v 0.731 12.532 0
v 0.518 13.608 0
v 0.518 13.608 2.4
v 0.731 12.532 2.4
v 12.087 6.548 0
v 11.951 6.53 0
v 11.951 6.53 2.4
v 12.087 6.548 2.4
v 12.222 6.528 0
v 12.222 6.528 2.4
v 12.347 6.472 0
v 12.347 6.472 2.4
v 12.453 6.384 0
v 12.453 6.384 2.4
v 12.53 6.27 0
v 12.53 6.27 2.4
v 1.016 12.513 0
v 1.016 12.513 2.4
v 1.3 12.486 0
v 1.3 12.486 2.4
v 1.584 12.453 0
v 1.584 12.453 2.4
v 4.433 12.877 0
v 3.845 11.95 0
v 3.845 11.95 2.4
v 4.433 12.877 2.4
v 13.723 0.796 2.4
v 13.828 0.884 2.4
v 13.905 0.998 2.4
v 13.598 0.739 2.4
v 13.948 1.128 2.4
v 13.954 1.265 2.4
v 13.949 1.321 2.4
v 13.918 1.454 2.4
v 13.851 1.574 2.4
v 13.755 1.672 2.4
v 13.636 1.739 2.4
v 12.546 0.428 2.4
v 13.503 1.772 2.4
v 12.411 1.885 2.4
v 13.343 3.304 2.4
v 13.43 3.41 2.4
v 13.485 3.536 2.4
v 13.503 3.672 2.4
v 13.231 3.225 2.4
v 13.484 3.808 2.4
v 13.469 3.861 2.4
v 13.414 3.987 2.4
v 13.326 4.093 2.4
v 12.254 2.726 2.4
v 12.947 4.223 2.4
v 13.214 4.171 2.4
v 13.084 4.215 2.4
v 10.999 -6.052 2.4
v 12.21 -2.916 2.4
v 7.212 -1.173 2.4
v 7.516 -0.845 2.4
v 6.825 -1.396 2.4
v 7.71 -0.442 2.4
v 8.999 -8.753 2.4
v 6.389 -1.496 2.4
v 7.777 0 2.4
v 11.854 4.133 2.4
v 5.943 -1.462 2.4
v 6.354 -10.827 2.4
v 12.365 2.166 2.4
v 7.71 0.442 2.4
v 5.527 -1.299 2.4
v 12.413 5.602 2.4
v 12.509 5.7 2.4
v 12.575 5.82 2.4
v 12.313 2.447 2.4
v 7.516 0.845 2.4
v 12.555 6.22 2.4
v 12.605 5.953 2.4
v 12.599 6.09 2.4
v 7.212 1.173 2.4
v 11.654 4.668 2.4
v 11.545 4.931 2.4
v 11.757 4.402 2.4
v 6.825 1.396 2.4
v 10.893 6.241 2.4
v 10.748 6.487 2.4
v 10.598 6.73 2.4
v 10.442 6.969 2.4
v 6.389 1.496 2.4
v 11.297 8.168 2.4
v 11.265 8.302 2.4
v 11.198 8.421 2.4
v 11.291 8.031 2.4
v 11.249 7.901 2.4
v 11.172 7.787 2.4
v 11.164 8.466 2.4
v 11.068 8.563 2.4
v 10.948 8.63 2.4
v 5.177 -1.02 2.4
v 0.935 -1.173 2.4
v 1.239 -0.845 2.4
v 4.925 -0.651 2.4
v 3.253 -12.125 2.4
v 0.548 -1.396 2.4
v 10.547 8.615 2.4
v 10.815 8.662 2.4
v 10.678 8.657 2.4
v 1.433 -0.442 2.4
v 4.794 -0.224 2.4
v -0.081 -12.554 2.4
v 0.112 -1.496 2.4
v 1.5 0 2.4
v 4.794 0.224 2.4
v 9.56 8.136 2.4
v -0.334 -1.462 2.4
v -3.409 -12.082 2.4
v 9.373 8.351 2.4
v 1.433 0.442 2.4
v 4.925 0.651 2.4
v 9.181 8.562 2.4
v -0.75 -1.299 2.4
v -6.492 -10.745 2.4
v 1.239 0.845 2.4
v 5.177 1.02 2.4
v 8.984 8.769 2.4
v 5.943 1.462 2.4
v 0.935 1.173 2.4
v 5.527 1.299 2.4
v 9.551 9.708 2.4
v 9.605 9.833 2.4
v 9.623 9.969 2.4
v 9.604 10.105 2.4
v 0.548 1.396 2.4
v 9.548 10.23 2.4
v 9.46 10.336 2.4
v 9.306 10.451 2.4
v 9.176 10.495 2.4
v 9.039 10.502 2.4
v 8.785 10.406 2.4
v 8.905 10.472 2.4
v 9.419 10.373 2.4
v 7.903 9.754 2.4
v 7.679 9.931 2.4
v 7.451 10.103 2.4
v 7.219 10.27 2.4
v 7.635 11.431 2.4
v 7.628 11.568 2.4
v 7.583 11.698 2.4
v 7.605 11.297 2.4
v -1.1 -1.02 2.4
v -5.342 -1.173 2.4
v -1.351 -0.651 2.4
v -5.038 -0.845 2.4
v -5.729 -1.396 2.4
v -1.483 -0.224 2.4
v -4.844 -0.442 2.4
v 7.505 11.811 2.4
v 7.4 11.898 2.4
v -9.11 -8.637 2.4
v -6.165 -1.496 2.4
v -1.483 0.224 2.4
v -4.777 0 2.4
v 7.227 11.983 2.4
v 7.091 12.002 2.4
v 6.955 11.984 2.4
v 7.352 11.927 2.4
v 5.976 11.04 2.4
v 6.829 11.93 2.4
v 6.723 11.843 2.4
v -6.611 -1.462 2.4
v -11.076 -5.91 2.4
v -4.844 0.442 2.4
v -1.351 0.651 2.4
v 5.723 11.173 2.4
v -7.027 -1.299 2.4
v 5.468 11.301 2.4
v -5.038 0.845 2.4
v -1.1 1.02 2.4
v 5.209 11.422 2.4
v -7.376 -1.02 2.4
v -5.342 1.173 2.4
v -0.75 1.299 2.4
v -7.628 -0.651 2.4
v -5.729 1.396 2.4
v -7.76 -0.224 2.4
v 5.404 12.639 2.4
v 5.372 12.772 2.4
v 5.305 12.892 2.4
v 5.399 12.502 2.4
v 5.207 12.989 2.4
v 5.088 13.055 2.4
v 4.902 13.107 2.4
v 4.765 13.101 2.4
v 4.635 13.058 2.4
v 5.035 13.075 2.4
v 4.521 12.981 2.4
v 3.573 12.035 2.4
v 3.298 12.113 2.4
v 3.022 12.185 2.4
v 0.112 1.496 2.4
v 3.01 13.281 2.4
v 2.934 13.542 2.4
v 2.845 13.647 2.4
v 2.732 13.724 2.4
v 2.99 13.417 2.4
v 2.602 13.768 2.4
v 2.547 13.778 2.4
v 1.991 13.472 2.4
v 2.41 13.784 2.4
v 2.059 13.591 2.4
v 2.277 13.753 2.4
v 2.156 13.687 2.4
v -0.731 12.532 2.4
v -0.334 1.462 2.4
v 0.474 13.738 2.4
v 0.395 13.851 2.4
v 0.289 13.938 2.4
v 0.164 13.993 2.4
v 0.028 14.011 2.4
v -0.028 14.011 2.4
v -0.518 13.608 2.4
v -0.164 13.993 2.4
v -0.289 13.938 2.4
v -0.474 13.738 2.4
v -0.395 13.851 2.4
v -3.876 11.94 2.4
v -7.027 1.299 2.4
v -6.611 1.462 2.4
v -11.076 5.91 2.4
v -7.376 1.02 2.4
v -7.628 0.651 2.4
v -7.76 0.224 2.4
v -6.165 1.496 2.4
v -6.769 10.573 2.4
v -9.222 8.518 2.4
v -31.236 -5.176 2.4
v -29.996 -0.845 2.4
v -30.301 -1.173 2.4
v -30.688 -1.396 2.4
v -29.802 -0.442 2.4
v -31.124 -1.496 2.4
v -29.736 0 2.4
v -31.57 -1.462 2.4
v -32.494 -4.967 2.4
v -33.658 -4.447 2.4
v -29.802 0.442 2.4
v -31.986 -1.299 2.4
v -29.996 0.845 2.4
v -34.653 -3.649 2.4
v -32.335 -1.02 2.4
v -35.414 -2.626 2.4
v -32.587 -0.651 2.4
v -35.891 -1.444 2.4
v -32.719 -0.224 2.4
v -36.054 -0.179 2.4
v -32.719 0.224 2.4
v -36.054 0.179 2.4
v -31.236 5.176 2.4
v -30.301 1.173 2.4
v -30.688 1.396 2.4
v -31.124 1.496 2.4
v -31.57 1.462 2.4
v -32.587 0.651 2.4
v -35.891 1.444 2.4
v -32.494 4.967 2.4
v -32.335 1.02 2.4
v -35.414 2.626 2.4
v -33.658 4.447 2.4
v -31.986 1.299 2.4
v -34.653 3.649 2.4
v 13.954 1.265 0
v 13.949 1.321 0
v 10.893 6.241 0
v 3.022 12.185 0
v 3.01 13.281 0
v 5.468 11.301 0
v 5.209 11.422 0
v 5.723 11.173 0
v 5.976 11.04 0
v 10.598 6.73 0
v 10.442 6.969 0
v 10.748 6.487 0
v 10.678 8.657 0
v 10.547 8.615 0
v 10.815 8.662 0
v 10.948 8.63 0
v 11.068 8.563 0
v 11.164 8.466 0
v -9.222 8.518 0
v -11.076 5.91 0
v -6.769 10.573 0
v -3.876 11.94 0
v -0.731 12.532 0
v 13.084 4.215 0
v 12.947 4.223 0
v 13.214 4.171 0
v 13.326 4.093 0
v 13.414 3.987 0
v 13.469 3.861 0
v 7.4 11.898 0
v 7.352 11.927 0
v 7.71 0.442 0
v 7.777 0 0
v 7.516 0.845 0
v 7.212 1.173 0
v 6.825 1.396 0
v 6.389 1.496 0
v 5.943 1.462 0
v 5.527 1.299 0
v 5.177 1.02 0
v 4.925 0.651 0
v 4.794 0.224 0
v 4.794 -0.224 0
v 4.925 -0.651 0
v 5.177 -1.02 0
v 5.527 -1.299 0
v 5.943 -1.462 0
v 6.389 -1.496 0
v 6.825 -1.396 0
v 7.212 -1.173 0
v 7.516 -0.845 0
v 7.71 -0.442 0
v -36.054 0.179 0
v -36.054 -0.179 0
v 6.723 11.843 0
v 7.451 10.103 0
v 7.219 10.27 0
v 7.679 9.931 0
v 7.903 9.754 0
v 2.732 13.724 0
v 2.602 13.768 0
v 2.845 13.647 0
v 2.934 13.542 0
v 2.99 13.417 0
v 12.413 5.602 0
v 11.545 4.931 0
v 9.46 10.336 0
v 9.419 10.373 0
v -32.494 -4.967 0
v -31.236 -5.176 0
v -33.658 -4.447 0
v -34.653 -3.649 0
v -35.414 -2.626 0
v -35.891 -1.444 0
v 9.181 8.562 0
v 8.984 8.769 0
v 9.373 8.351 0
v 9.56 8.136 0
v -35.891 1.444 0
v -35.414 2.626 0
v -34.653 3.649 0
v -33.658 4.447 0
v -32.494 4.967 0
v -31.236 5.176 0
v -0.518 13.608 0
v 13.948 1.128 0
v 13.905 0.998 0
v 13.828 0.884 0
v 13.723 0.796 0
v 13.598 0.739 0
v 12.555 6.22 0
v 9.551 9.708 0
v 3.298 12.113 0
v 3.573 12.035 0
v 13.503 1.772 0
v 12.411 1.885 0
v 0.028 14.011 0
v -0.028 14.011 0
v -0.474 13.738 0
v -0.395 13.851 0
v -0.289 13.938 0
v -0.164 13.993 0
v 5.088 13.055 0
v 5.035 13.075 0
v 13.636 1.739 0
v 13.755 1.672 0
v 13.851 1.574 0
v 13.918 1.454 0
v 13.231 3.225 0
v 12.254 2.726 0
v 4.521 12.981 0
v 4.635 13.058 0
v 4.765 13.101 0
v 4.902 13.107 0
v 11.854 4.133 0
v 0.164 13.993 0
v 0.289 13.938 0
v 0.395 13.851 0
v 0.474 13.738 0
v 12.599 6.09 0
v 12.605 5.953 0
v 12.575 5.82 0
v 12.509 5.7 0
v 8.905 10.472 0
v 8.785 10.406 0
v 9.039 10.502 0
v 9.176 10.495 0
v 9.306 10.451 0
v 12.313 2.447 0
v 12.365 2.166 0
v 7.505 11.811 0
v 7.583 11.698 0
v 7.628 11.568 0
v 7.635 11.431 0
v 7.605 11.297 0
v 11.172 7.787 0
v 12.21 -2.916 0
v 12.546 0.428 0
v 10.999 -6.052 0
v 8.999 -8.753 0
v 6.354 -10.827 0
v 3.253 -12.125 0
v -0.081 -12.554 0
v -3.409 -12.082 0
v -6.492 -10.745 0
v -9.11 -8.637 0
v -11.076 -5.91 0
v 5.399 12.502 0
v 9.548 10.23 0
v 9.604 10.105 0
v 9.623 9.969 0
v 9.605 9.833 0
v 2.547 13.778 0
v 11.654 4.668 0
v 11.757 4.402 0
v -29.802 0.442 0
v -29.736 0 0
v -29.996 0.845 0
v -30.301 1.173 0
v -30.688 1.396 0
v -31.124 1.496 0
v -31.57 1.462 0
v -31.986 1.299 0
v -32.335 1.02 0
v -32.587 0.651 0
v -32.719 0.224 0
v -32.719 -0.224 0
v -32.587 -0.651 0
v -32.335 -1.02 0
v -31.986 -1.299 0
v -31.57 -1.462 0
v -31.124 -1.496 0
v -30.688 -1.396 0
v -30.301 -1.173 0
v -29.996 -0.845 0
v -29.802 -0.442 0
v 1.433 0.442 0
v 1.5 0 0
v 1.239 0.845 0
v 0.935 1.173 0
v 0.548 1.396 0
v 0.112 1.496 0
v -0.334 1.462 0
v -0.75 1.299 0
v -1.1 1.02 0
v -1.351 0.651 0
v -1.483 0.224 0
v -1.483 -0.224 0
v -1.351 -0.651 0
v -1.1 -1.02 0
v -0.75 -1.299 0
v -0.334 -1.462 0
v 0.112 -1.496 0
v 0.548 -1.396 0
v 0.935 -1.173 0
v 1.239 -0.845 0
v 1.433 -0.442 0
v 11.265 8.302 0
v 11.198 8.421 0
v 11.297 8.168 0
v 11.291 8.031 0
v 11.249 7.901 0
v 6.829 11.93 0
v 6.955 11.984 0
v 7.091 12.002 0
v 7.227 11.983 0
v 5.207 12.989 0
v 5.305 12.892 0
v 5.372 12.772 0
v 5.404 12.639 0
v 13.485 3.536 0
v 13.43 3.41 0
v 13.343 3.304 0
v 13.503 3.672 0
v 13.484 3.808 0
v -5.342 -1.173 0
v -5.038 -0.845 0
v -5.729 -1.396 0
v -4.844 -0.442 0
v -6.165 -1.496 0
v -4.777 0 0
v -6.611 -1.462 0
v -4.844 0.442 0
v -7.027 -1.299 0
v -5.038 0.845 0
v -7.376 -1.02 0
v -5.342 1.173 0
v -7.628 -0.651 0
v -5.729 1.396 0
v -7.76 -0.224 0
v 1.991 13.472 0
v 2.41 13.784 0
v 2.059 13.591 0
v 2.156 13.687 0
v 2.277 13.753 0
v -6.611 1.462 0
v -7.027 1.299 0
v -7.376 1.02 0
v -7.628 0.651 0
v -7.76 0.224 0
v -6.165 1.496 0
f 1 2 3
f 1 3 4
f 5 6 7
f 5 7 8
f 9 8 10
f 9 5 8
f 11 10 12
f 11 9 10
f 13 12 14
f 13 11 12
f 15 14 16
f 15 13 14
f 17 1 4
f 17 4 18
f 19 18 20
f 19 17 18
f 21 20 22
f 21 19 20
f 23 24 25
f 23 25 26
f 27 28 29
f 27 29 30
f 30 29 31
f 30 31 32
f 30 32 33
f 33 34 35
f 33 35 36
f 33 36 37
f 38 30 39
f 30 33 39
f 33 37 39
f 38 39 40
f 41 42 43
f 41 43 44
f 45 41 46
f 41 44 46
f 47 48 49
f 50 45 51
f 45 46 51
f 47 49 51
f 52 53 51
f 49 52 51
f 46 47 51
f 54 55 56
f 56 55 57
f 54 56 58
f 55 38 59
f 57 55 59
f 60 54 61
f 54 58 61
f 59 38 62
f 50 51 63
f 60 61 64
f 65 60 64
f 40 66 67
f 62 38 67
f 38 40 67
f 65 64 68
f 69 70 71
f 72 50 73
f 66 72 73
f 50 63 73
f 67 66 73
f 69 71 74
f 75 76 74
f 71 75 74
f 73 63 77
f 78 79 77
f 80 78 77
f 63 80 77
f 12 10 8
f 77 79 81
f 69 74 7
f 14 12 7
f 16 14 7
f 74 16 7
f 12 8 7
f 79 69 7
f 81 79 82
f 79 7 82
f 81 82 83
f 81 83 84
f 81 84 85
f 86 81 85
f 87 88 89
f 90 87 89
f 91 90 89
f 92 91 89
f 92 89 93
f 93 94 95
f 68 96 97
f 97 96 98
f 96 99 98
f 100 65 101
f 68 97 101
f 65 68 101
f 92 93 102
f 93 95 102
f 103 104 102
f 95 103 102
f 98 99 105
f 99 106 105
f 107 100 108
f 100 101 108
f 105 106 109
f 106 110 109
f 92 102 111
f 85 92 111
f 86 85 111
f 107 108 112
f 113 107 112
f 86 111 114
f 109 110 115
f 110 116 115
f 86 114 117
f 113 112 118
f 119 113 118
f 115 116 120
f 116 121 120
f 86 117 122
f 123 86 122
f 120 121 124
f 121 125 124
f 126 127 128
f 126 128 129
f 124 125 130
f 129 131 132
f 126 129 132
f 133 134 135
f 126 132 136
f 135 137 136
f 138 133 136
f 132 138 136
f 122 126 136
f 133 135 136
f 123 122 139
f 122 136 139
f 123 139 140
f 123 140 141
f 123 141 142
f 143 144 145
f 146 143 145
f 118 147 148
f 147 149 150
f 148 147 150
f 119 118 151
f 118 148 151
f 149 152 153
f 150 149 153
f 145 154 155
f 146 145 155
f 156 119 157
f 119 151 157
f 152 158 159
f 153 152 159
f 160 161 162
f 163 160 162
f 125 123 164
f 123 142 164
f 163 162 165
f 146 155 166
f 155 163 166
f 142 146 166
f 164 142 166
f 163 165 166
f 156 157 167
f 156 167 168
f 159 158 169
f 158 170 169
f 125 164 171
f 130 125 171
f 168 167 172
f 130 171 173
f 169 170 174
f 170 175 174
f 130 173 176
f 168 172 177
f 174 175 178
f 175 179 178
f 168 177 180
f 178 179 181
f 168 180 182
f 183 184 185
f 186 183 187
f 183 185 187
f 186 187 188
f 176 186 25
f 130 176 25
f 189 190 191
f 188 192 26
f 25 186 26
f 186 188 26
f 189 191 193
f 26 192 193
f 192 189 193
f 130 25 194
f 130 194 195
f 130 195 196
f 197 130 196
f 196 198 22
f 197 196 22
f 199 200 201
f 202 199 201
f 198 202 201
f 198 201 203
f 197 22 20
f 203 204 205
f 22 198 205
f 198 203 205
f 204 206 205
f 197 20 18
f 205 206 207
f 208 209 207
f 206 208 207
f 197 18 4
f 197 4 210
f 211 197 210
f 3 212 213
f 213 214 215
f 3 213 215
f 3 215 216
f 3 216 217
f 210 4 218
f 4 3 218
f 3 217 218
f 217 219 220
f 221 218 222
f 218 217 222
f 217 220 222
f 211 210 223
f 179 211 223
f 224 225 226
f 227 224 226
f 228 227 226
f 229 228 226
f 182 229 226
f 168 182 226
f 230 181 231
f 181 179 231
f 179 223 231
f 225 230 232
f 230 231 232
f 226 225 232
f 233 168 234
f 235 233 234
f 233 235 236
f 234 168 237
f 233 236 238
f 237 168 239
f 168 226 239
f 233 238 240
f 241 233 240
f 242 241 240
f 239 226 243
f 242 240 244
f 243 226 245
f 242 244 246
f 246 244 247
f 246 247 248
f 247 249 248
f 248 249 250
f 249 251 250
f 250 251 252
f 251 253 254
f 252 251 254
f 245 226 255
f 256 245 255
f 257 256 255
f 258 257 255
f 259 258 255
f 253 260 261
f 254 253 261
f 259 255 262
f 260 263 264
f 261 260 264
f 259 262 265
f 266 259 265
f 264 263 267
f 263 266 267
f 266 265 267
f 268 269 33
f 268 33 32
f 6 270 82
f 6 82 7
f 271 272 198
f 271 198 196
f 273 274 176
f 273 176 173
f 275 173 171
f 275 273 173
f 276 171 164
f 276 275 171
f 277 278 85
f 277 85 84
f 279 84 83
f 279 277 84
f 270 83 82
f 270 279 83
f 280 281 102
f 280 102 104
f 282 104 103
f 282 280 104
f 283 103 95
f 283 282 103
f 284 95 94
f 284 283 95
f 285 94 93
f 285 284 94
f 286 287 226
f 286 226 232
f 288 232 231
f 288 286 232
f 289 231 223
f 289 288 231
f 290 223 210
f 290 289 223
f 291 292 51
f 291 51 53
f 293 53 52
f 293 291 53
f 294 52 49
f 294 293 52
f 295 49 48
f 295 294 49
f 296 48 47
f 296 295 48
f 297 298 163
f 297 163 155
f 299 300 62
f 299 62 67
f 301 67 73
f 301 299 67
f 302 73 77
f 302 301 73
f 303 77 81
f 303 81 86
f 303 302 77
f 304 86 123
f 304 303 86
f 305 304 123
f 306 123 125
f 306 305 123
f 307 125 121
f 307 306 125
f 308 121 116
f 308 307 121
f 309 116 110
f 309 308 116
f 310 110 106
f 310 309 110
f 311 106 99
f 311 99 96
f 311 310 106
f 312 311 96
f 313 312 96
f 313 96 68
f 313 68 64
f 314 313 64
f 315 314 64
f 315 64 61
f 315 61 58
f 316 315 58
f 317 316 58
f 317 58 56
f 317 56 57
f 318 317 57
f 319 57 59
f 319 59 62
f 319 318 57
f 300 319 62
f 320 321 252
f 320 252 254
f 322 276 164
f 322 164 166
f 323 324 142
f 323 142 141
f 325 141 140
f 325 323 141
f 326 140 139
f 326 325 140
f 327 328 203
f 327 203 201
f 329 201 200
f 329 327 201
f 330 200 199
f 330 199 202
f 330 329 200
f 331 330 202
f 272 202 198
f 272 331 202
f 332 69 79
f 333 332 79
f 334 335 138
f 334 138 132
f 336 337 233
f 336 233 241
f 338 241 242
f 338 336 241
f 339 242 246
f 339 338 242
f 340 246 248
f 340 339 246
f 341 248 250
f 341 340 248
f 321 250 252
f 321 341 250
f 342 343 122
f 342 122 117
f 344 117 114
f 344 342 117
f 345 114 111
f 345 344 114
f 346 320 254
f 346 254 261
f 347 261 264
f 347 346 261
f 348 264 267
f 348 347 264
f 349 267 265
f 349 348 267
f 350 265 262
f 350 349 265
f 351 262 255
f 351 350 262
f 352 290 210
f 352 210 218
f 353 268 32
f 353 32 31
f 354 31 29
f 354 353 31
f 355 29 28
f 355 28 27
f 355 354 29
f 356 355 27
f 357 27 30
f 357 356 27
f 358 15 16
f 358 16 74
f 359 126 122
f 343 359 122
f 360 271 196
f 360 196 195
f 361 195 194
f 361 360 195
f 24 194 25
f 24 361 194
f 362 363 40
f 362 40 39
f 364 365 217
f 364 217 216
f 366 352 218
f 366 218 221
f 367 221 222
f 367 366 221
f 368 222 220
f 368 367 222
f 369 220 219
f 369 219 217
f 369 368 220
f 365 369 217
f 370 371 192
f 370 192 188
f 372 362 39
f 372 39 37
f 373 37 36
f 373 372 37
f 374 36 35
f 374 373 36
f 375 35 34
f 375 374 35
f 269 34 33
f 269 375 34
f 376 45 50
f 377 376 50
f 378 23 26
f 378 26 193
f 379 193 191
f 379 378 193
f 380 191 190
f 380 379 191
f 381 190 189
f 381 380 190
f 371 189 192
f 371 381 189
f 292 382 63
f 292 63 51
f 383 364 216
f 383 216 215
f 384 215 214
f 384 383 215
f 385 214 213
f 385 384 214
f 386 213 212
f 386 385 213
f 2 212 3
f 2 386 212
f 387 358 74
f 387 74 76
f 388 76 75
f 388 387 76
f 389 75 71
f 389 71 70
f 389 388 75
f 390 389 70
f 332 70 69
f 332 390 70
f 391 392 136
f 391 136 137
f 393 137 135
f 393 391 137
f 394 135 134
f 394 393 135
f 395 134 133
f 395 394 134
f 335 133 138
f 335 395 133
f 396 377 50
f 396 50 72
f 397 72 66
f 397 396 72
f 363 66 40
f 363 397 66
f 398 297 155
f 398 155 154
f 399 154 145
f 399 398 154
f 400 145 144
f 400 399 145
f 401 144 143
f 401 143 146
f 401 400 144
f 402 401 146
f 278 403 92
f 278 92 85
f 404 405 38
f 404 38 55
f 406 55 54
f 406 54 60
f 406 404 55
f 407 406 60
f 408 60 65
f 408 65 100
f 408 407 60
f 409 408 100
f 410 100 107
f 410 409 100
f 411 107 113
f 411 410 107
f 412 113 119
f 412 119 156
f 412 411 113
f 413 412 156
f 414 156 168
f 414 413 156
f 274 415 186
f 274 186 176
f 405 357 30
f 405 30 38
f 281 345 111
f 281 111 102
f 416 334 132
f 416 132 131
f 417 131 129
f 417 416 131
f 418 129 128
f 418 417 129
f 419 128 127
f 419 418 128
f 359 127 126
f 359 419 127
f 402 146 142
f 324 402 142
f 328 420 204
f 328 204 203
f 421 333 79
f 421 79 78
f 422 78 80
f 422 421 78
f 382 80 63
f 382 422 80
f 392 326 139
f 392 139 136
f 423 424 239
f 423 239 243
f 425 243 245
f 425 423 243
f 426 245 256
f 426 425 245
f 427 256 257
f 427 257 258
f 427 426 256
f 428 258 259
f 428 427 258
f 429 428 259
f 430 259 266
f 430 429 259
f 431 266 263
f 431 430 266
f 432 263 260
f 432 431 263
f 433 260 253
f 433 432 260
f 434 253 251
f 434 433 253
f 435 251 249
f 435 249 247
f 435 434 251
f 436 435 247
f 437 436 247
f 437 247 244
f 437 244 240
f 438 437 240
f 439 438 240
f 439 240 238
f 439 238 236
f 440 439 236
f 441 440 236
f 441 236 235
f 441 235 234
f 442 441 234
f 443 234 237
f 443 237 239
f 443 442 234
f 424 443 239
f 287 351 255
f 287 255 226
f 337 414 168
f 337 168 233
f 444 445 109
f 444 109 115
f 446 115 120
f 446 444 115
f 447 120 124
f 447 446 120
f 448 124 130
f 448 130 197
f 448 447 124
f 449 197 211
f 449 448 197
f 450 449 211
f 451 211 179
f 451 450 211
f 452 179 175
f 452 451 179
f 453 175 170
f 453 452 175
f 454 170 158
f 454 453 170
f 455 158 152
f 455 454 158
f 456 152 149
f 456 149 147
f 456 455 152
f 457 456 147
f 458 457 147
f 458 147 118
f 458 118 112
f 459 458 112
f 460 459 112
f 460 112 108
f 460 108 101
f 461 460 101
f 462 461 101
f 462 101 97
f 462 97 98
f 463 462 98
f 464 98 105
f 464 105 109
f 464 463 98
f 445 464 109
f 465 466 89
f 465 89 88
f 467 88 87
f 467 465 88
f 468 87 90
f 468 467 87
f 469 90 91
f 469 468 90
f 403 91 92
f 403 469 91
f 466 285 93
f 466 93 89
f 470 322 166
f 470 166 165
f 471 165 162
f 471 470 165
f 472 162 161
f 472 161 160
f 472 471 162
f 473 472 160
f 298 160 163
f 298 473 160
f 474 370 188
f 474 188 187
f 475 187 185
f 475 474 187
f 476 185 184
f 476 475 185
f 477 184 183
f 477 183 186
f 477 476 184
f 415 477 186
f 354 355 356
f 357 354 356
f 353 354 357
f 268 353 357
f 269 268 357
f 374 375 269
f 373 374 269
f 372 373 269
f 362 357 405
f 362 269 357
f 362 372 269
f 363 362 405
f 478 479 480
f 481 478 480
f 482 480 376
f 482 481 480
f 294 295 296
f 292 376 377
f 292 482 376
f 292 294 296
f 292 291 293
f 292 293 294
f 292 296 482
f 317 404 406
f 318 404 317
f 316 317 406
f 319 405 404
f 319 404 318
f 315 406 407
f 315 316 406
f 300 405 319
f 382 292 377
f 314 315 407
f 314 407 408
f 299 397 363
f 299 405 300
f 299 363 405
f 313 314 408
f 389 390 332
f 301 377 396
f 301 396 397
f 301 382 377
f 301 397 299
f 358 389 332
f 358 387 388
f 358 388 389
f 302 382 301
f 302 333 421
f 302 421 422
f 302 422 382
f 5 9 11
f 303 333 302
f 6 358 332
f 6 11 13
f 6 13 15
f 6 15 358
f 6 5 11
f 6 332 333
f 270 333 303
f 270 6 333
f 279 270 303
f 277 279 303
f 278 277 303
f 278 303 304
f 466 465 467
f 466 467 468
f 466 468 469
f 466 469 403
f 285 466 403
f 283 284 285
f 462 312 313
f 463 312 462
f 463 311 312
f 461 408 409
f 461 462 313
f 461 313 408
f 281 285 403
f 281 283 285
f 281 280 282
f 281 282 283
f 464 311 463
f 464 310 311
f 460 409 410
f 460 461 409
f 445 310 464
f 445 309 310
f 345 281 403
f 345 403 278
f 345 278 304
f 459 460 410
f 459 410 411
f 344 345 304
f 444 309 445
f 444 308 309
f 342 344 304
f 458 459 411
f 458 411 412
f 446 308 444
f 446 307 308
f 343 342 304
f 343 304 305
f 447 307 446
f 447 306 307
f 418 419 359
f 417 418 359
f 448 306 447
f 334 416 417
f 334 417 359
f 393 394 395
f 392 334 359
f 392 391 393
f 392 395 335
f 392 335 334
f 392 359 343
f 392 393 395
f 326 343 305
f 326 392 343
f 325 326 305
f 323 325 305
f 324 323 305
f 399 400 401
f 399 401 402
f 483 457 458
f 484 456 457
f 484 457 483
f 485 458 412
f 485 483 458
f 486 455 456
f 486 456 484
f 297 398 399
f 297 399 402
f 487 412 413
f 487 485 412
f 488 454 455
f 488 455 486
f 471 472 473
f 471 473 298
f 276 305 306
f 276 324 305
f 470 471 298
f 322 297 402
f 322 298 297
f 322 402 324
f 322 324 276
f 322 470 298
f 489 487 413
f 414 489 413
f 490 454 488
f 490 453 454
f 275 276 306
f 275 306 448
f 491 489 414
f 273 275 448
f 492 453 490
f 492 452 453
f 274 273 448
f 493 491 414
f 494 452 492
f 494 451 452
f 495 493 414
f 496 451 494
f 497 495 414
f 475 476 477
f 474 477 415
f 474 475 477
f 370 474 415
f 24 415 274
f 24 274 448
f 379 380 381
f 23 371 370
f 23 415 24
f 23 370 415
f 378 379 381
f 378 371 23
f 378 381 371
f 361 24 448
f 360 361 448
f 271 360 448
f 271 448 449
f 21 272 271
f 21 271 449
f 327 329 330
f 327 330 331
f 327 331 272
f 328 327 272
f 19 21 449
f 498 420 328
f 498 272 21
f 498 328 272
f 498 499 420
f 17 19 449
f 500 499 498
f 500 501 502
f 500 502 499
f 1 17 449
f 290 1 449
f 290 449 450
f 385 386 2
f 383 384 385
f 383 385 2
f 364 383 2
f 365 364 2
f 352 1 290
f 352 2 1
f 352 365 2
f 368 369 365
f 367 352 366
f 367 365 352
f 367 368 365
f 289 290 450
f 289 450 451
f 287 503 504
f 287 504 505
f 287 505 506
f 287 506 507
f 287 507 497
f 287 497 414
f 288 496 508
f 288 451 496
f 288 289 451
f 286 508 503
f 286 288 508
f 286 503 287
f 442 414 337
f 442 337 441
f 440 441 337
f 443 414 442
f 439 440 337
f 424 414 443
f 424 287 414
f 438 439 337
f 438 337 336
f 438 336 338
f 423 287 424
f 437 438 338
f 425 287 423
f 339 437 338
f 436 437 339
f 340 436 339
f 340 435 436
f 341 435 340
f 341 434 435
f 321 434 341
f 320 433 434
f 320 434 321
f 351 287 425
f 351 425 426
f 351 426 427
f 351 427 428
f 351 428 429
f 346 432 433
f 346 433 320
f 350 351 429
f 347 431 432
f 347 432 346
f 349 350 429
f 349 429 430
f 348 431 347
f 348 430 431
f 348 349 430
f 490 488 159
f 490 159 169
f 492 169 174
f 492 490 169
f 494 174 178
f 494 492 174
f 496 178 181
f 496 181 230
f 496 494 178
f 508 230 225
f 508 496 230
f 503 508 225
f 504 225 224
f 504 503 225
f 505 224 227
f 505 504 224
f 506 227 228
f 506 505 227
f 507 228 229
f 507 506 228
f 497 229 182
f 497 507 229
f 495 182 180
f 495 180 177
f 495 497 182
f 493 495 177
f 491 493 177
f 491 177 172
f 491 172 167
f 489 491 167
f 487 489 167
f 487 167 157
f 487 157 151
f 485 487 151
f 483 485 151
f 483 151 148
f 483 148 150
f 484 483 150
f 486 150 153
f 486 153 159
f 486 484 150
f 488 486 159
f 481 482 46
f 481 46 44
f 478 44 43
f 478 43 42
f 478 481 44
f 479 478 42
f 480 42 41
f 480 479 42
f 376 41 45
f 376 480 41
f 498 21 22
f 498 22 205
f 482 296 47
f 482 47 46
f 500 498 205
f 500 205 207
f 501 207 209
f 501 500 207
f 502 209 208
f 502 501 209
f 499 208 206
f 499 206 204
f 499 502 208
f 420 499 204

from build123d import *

# Parameters (mm, degrees)
SKETCH1_R           = 1.5
BOSS_EXTRUDE1_DEPTH = 2.4


with BuildPart() as part:
    # Sketch1 → Boss-Extrude1 (new body)
    with BuildSketch(Plane.XY):
        with BuildLine():
            Line((2.547107201, 13.777973489), (2.60207137, 13.767698905))
            ThreePointArc((2.60207137, 13.767698905), (2.893171321, 13.597662774), (3.010168721, 13.281493396))
            Line((3.010168721, 13.281493396), (3.021754222, 12.184659018))
            ThreePointArc((3.021754222, 12.184659018), (3.435499758, 12.074529199), (3.845249182, 11.950354501))
            Line((3.845249182, 11.950354501), (4.432508267, 12.876802904))
            ThreePointArc((4.432508267, 12.876802904), (4.698423191, 13.084024332), (5.035433845, 13.075347588))
            Line((5.035433845, 13.075347588), (5.087574195, 13.055148308))
            ThreePointArc((5.087574195, 13.055148308), (5.342473559, 12.83451789), (5.399382885, 12.502233681))
            Line((5.399382885, 12.502233681), (5.209228333, 11.421946163))
            ThreePointArc((5.209228333, 11.421946163), (5.595692764, 11.23766597), (5.975648384, 11.040314323))
            Line((5.975648384, 11.040314323), (6.723142715, 11.843079608))
            ThreePointArc((6.723142715, 11.843079608), (7.02260677, 11.997910958), (7.35228483, 11.927456407))
            Line((7.35228483, 11.927456407), (7.399825783, 11.898020294))
            ThreePointArc((7.399825783, 11.898020294), (7.609844268, 11.634308893), (7.604727542, 11.297225393))
            Line((7.604727542, 11.297225393), (7.219308422, 10.27027263))
            ThreePointArc((7.219308422, 10.27027263), (7.565331165, 10.018117505), (7.902554048, 9.754309483))
            Line((7.902554048, 9.754309483), (8.784828602, 10.406054439))
            ThreePointArc((8.784828602, 10.406054439), (9.107643898, 10.503223117), (9.418762572, 10.373390003))
            Line((9.418762572, 10.373390003), (9.460085179, 10.335719469))
            ThreePointArc((9.460085179, 10.335719469), (9.618070857, 10.03790746), (9.551102323, 9.707503643))
            Line((9.551102323, 9.707503643), (8.98354362, 8.76885728))
            ThreePointArc((8.98354362, 8.76885728), (9.277341286, 8.457414063), (9.560347713, 8.136133332))
            Line((9.560347713, 8.136133332), (10.547357686, 8.614663568))
            ThreePointArc((10.547357686, 8.614663568), (10.882531136, 8.650860609), (11.164495652, 8.466070244))
            Line((11.164495652, 8.466070244), (11.198192721, 8.421448114))
            ThreePointArc((11.198192721, 8.421448114), (11.298765579, 8.099677128), (11.172225769, 7.7872045))
            Line((11.172225769, 7.7872045), (10.441855016, 6.968829012))
            ThreePointArc((10.441855016, 6.968829012), (10.673422677, 6.608703529), (10.892575202, 6.240890918))
            Line((10.892575202, 6.240890918), (11.950709155, 6.529910661))
            ThreePointArc((11.950709155, 6.529910661), (12.286826829, 6.503903419), (12.530035223, 6.270448618))
            Line((12.530035223, 6.270448618), (12.55495924, 6.220394444))
            ThreePointArc((12.55495924, 6.220394444), (12.594694391, 5.885622006), (12.412892467, 5.601721447))
            Line((12.412892467, 5.601721447), (11.544581562, 4.931485631))
            ThreePointArc((11.544581562, 4.931485631), (11.70603346, 4.534941522), (11.853869106, 4.133122449))
            Line((11.853869106, 4.133122449), (12.947093557, 4.222789479))
            ThreePointArc((12.947093557, 4.222789479), (13.27270937, 4.135463598), (13.468879472, 3.861294384))
            Line((13.468879472, 3.861294384), (13.48418168, 3.807512701))
            ThreePointArc((13.48418168, 3.807512701), (13.461725991, 3.471139085), (13.230852999, 3.225478489))
            Line((13.230852999, 3.225478489), (12.254171229, 2.726206422))
            ThreePointArc((12.254171229, 2.726206422), (12.340009313, 2.306747521), (12.411493716, 1.884605453))
            Line((12.411493716, 1.884605453), (13.502580216, 1.771866265))
            ThreePointArc((13.502580216, 1.771866265), (13.806605713, 1.626195525), (13.949057185, 1.320648401))
            Line((13.949057185, 1.320648401), (13.954216486, 1.26497068))
            ThreePointArc((13.954216486, 1.26497068), (13.870334657, 0.938450687), (13.598252701, 0.73939573))
            Line((13.598252701, 0.73939573), (12.546459793, 0.428089522))
            ThreePointArc((12.546459793, 0.428089522), (3.253260702, -12.124900362), (-11.075595423, -5.91))
            Line((-11.075595423, -5.91), (-31.235799276, -5.175527107))
            ThreePointArc((-31.235799276, -5.175527107), (-34.653079748, -3.649418925), (-36.053760949, -0.178842001))
            Line((-36.053760949, -0.178842001), (-36.053760949, 0.178842001))
            ThreePointArc((-36.053760949, 0.178842001), (-34.653079748, 3.649418925), (-31.235799276, 5.175527107))
            Line((-31.235799276, 5.175527107), (-11.075595423, 5.91))
            ThreePointArc((-11.075595423, 5.91), (-6.768701925, 10.572681222), (-0.731377895, 12.532437925))
            Line((-0.731377895, 12.532437925), (-0.518446871, 13.608467783))
            ThreePointArc((-0.518446871, 13.608467783), (-0.345345603, 13.89775556), (-0.027958125, 14.011407027))
            Line((-0.027958125, 14.011407027), (0.027958125, 14.011407027))
            ThreePointArc((0.027958125, 14.011407027), (0.345345603, 13.89775556), (0.518446871, 13.608467783))
            Line((0.518446871, 13.608467783), (0.731377895, 12.532437925))
            ThreePointArc((0.731377895, 12.532437925), (1.158314928, 12.500208818), (1.58390463, 12.453439689))
            Line((1.58390463, 12.453439689), (1.990930066, 13.472022121))
            ThreePointArc((1.990930066, 13.472022121), (2.214240445, 13.72457695), (2.547107201, 13.777973489))
        make_face()
        with Locations((6.276880475, 0)):
            Circle(SKETCH1_R, mode=Mode.SUBTRACT)
        with Locations((-6.276880475, 0)):
            Circle(SKETCH1_R, mode=Mode.SUBTRACT)
        Circle(SKETCH1_R, mode=Mode.SUBTRACT)
        with Locations((-31.235799276, 0)):
            Circle(SKETCH1_R, mode=Mode.SUBTRACT)
    extrude(amount=BOSS_EXTRUDE1_DEPTH)


solid = part.part
